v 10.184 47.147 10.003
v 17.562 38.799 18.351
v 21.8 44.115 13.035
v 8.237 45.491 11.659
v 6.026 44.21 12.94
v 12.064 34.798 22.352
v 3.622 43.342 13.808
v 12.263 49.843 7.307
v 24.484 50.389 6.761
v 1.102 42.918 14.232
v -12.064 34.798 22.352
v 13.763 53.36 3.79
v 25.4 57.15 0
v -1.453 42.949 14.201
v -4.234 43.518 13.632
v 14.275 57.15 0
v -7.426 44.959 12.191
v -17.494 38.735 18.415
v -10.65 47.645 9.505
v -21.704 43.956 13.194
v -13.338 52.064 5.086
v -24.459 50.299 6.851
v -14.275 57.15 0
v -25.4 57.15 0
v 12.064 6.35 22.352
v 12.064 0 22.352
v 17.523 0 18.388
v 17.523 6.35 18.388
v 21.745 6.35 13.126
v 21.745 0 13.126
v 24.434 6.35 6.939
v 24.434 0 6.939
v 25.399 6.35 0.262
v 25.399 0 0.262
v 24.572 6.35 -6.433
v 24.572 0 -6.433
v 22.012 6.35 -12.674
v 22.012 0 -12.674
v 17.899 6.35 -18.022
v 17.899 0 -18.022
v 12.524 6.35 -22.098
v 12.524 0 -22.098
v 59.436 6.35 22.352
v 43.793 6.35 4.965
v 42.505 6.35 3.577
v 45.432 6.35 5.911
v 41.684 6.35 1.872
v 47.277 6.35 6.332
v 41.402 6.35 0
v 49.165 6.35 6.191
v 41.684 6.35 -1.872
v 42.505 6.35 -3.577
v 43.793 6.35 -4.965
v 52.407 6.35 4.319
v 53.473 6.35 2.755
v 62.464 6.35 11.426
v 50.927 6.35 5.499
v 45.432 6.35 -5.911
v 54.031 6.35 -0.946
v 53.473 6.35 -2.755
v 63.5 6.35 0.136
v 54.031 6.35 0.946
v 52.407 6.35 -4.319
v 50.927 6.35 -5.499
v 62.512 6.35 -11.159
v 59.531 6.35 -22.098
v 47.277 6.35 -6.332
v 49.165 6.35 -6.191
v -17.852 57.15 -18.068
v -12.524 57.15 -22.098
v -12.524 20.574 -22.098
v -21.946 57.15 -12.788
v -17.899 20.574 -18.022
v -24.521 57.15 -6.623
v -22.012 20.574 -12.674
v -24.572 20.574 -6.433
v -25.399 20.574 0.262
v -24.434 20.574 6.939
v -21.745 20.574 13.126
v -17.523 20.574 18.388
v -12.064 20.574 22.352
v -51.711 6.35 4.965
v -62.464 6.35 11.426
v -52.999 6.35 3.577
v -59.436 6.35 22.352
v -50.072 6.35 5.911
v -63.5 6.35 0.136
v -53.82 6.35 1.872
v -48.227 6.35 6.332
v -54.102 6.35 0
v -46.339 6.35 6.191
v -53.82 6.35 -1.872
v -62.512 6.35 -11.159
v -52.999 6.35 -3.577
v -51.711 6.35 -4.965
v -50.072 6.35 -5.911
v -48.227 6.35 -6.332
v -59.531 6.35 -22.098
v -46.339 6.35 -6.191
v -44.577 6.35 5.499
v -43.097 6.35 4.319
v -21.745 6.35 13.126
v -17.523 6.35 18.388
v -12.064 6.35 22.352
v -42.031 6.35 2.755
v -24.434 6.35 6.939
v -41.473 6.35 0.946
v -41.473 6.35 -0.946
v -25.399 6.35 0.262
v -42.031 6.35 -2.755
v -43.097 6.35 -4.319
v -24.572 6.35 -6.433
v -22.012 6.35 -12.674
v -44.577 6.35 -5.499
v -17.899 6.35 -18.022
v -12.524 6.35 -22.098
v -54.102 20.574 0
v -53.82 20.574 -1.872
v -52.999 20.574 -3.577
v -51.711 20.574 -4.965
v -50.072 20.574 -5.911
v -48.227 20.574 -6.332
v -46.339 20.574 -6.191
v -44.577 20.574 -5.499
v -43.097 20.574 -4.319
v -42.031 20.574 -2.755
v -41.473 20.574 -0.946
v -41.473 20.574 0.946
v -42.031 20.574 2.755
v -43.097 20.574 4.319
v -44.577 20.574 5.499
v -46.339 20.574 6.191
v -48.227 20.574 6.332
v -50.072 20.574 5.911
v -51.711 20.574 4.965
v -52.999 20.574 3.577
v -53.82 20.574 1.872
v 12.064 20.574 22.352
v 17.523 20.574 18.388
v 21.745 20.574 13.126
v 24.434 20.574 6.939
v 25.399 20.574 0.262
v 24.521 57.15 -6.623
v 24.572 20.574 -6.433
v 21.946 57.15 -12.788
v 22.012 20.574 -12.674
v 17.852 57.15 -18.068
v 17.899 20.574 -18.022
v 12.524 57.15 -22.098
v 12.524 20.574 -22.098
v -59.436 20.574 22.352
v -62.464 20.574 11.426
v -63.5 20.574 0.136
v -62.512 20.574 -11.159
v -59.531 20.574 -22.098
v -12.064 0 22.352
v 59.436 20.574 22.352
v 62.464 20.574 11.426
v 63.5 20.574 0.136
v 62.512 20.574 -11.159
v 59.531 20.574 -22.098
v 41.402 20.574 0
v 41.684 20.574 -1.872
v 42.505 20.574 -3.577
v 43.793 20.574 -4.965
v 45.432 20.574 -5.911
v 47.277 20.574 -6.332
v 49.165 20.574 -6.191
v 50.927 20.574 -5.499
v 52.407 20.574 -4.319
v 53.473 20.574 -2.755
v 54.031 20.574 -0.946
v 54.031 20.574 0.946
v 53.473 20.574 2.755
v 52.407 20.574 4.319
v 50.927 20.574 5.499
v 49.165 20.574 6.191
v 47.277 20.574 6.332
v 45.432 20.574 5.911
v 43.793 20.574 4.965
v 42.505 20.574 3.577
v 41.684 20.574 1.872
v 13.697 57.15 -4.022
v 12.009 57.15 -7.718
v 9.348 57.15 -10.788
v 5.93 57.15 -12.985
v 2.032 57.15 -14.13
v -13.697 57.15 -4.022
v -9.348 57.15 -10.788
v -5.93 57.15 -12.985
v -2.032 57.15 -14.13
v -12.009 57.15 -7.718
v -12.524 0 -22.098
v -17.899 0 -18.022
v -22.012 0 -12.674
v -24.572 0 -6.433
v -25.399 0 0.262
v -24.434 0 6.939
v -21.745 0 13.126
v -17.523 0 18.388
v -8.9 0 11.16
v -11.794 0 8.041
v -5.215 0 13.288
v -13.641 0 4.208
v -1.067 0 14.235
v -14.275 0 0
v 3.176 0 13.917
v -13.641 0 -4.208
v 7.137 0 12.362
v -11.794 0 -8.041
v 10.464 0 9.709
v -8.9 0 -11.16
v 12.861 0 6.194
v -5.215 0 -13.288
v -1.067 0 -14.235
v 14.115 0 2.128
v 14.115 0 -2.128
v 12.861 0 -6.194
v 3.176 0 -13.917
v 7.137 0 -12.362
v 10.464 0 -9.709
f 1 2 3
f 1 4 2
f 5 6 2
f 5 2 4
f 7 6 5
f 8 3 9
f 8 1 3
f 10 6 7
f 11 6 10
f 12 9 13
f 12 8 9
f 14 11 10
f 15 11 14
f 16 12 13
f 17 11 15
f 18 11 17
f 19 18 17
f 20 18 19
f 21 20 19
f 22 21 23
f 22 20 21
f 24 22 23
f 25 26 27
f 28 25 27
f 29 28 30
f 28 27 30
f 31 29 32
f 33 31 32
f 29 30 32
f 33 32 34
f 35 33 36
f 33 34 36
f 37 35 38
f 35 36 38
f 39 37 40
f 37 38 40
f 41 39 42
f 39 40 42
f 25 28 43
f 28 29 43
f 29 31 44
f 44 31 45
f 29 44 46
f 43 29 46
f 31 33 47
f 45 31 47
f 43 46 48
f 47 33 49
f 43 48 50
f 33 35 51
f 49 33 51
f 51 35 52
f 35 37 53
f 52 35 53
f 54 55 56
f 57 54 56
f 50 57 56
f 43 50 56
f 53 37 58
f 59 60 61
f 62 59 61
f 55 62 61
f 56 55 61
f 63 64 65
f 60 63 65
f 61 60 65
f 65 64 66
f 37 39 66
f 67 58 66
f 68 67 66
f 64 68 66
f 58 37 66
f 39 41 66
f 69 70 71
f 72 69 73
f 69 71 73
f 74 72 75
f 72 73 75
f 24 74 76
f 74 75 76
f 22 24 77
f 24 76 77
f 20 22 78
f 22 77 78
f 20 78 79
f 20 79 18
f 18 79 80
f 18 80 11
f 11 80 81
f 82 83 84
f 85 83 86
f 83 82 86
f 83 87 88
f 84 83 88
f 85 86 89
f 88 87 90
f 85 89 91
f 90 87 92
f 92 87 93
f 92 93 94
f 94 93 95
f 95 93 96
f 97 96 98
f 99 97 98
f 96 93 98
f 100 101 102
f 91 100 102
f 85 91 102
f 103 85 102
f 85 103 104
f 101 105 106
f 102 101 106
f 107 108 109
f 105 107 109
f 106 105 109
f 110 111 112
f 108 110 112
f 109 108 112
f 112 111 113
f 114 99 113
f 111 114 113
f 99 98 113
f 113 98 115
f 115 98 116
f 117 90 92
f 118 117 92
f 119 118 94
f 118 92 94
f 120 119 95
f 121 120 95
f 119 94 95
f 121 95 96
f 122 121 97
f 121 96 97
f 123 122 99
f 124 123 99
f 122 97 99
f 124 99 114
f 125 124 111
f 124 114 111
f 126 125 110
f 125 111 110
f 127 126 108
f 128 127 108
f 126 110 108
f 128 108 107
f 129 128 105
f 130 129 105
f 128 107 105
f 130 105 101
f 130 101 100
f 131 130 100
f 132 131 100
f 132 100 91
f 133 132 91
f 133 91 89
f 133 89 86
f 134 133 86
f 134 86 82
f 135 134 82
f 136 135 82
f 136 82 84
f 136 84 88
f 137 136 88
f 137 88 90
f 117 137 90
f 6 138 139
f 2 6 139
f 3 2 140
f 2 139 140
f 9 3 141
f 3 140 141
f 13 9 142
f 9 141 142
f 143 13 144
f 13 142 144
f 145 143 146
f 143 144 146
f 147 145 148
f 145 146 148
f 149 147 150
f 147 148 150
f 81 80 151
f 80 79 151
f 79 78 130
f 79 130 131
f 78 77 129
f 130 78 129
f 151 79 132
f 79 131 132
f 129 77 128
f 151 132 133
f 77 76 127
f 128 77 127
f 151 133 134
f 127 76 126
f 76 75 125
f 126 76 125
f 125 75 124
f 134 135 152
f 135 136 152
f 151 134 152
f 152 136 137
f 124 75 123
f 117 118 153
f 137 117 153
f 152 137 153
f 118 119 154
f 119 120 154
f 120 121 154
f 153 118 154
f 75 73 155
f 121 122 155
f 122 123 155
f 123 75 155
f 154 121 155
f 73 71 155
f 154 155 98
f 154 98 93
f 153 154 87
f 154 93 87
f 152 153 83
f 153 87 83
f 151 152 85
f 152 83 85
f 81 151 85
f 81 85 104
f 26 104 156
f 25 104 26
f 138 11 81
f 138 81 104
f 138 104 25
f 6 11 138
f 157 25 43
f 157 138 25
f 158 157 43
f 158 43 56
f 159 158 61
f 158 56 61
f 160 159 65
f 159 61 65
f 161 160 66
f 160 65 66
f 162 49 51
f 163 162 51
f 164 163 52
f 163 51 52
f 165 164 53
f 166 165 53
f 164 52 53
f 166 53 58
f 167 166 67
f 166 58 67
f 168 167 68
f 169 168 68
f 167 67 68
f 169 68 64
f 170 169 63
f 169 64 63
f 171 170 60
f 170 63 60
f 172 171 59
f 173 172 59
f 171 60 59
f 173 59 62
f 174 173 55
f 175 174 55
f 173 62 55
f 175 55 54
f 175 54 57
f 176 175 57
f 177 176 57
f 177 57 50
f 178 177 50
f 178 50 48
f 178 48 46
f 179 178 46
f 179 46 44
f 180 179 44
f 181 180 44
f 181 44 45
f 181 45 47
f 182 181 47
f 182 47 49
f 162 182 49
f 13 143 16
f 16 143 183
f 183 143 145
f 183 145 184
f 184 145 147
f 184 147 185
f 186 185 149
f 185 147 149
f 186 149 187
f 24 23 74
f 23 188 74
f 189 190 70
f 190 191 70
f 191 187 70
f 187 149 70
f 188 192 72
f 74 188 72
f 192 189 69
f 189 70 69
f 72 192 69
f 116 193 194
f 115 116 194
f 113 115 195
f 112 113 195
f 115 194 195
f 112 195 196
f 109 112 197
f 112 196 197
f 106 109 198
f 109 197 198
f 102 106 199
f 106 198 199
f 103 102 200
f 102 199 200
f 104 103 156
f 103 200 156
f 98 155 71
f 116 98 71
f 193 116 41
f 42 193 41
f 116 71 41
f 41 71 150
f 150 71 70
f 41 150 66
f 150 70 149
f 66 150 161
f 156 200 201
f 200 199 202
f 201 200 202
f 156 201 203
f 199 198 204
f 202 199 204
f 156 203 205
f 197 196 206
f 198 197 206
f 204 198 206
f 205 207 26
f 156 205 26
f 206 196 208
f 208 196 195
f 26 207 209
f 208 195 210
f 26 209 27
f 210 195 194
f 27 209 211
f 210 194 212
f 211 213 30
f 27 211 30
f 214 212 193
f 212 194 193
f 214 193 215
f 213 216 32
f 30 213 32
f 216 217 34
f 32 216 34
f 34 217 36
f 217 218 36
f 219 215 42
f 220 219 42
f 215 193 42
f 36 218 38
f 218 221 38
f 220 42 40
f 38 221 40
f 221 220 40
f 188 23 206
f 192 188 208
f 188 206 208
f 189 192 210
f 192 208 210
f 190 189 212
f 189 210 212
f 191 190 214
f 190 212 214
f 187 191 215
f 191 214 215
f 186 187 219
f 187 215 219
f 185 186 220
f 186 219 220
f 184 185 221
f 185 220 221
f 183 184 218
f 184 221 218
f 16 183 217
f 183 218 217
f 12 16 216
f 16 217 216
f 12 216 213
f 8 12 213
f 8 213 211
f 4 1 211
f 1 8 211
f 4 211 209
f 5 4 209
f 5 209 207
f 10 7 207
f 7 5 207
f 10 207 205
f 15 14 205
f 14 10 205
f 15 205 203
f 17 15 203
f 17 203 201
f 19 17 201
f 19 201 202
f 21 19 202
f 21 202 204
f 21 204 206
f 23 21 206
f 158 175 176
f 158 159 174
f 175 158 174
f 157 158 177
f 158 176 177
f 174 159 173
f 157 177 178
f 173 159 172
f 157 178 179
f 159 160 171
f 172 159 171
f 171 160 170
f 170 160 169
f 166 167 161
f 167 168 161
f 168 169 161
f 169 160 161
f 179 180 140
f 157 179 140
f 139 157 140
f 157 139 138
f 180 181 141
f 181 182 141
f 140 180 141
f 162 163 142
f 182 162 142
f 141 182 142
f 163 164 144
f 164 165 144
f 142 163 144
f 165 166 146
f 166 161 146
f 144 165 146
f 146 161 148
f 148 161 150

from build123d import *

# Parameters (mm, degrees)
SKETCH3_W                  = 118.872
SKETCH3_H                  = 41.148
CUT_EXTRUDE1_DEPTH         = 107.4453968
SKETCH4_W                  = 119.061805732
SKETCH4_H                  = 41.402
CUT_EXTRUDE2_DEPTH         = 107.4453968
F_1_2_1_124_DOWEL_HOLE1_D  = 28.5496
F_1_2_0_5000_DOWEL_HOLE1_D = 12.7
CHAMFER1_SIZE              = 22.352


with BuildPart() as part:
    # Sketch2 → Revolve1 (revolve)
    with BuildSketch(Plane.XY, mode=Mode.PRIVATE) as revolve1_sk:
        Polygon((-63.5, 20.574), (-63.5, 6.35), (-25.4, 6.35), (-25.4, 0), (0, 0), (0, 57.15), (-25.4, 57.15), (-25.4, 20.574), align=None)
    revolve(revolve1_sk.sketch.rotate(Axis((0, 0, 0), (0, 1, 0)), 180), axis=Axis((0, 0, 0), (0, 1, 0)))

    # Sketch3 → Cut-Extrude1 (cut, through all)
    with BuildSketch(Plane(origin=(0, 57.15, 0), x_dir=(1, 0, 0), z_dir=(0, 1, 0))):
        with Locations((0, -42.926)):
            Rectangle(SKETCH3_W, SKETCH3_H)
    extrude(amount=-CUT_EXTRUDE1_DEPTH, mode=Mode.SUBTRACT)

    # Sketch4 → Cut-Extrude2 (cut, through all)
    with BuildSketch(Plane(origin=(0, 57.15, 0), x_dir=(1, 0, 0), z_dir=(0, 1, 0))):
        with Locations((0, 42.799)):
            Rectangle(SKETCH4_W, SKETCH4_H)
    extrude(amount=-CUT_EXTRUDE2_DEPTH, mode=Mode.SUBTRACT)

    # 1/2 (1.124) Dowel Hole1 (through all)
    with Locations(Plane(origin=(0, 57.15, 0), x_dir=(1, 0, 0), z_dir=(0, 1, 0))):
        with Locations((0, 0)):
            Hole(F_1_2_1_124_DOWEL_HOLE1_D / 2)

    # 1/2 (0.5000) Dowel Hole1 (through all)
    with Locations(Plane(origin=(0, 20.574, 0), x_dir=(1, 0, 0), z_dir=(0, 1, 0))):
        with Locations((-47.752, 0), (47.752, 0)):
            Hole(F_1_2_0_5000_DOWEL_HOLE1_D / 2)

    # Chamfer1
    # the kernel refuses this chamfer: 22.352 mm, written as the material it takes off along each edge
    with BuildSketch(Plane(origin=(-69.546589707, 57.15, 22.352), x_dir=(0, -0.9996219169112968, 0.027495876610586365), z_dir=(1, 0, 0))) as chamfer1_piece_1:
        Polygon((CHAMFER1_SIZE * 0.999621916911, CHAMFER1_SIZE * 0.0274958766106), (-CHAMFER1_SIZE * 0.0274958766106, CHAMFER1_SIZE * 0.999621916911), (0, 0), align=None)
    extrude(amount=139.093179415, mode=Mode.SUBTRACT)


solid = part.part
